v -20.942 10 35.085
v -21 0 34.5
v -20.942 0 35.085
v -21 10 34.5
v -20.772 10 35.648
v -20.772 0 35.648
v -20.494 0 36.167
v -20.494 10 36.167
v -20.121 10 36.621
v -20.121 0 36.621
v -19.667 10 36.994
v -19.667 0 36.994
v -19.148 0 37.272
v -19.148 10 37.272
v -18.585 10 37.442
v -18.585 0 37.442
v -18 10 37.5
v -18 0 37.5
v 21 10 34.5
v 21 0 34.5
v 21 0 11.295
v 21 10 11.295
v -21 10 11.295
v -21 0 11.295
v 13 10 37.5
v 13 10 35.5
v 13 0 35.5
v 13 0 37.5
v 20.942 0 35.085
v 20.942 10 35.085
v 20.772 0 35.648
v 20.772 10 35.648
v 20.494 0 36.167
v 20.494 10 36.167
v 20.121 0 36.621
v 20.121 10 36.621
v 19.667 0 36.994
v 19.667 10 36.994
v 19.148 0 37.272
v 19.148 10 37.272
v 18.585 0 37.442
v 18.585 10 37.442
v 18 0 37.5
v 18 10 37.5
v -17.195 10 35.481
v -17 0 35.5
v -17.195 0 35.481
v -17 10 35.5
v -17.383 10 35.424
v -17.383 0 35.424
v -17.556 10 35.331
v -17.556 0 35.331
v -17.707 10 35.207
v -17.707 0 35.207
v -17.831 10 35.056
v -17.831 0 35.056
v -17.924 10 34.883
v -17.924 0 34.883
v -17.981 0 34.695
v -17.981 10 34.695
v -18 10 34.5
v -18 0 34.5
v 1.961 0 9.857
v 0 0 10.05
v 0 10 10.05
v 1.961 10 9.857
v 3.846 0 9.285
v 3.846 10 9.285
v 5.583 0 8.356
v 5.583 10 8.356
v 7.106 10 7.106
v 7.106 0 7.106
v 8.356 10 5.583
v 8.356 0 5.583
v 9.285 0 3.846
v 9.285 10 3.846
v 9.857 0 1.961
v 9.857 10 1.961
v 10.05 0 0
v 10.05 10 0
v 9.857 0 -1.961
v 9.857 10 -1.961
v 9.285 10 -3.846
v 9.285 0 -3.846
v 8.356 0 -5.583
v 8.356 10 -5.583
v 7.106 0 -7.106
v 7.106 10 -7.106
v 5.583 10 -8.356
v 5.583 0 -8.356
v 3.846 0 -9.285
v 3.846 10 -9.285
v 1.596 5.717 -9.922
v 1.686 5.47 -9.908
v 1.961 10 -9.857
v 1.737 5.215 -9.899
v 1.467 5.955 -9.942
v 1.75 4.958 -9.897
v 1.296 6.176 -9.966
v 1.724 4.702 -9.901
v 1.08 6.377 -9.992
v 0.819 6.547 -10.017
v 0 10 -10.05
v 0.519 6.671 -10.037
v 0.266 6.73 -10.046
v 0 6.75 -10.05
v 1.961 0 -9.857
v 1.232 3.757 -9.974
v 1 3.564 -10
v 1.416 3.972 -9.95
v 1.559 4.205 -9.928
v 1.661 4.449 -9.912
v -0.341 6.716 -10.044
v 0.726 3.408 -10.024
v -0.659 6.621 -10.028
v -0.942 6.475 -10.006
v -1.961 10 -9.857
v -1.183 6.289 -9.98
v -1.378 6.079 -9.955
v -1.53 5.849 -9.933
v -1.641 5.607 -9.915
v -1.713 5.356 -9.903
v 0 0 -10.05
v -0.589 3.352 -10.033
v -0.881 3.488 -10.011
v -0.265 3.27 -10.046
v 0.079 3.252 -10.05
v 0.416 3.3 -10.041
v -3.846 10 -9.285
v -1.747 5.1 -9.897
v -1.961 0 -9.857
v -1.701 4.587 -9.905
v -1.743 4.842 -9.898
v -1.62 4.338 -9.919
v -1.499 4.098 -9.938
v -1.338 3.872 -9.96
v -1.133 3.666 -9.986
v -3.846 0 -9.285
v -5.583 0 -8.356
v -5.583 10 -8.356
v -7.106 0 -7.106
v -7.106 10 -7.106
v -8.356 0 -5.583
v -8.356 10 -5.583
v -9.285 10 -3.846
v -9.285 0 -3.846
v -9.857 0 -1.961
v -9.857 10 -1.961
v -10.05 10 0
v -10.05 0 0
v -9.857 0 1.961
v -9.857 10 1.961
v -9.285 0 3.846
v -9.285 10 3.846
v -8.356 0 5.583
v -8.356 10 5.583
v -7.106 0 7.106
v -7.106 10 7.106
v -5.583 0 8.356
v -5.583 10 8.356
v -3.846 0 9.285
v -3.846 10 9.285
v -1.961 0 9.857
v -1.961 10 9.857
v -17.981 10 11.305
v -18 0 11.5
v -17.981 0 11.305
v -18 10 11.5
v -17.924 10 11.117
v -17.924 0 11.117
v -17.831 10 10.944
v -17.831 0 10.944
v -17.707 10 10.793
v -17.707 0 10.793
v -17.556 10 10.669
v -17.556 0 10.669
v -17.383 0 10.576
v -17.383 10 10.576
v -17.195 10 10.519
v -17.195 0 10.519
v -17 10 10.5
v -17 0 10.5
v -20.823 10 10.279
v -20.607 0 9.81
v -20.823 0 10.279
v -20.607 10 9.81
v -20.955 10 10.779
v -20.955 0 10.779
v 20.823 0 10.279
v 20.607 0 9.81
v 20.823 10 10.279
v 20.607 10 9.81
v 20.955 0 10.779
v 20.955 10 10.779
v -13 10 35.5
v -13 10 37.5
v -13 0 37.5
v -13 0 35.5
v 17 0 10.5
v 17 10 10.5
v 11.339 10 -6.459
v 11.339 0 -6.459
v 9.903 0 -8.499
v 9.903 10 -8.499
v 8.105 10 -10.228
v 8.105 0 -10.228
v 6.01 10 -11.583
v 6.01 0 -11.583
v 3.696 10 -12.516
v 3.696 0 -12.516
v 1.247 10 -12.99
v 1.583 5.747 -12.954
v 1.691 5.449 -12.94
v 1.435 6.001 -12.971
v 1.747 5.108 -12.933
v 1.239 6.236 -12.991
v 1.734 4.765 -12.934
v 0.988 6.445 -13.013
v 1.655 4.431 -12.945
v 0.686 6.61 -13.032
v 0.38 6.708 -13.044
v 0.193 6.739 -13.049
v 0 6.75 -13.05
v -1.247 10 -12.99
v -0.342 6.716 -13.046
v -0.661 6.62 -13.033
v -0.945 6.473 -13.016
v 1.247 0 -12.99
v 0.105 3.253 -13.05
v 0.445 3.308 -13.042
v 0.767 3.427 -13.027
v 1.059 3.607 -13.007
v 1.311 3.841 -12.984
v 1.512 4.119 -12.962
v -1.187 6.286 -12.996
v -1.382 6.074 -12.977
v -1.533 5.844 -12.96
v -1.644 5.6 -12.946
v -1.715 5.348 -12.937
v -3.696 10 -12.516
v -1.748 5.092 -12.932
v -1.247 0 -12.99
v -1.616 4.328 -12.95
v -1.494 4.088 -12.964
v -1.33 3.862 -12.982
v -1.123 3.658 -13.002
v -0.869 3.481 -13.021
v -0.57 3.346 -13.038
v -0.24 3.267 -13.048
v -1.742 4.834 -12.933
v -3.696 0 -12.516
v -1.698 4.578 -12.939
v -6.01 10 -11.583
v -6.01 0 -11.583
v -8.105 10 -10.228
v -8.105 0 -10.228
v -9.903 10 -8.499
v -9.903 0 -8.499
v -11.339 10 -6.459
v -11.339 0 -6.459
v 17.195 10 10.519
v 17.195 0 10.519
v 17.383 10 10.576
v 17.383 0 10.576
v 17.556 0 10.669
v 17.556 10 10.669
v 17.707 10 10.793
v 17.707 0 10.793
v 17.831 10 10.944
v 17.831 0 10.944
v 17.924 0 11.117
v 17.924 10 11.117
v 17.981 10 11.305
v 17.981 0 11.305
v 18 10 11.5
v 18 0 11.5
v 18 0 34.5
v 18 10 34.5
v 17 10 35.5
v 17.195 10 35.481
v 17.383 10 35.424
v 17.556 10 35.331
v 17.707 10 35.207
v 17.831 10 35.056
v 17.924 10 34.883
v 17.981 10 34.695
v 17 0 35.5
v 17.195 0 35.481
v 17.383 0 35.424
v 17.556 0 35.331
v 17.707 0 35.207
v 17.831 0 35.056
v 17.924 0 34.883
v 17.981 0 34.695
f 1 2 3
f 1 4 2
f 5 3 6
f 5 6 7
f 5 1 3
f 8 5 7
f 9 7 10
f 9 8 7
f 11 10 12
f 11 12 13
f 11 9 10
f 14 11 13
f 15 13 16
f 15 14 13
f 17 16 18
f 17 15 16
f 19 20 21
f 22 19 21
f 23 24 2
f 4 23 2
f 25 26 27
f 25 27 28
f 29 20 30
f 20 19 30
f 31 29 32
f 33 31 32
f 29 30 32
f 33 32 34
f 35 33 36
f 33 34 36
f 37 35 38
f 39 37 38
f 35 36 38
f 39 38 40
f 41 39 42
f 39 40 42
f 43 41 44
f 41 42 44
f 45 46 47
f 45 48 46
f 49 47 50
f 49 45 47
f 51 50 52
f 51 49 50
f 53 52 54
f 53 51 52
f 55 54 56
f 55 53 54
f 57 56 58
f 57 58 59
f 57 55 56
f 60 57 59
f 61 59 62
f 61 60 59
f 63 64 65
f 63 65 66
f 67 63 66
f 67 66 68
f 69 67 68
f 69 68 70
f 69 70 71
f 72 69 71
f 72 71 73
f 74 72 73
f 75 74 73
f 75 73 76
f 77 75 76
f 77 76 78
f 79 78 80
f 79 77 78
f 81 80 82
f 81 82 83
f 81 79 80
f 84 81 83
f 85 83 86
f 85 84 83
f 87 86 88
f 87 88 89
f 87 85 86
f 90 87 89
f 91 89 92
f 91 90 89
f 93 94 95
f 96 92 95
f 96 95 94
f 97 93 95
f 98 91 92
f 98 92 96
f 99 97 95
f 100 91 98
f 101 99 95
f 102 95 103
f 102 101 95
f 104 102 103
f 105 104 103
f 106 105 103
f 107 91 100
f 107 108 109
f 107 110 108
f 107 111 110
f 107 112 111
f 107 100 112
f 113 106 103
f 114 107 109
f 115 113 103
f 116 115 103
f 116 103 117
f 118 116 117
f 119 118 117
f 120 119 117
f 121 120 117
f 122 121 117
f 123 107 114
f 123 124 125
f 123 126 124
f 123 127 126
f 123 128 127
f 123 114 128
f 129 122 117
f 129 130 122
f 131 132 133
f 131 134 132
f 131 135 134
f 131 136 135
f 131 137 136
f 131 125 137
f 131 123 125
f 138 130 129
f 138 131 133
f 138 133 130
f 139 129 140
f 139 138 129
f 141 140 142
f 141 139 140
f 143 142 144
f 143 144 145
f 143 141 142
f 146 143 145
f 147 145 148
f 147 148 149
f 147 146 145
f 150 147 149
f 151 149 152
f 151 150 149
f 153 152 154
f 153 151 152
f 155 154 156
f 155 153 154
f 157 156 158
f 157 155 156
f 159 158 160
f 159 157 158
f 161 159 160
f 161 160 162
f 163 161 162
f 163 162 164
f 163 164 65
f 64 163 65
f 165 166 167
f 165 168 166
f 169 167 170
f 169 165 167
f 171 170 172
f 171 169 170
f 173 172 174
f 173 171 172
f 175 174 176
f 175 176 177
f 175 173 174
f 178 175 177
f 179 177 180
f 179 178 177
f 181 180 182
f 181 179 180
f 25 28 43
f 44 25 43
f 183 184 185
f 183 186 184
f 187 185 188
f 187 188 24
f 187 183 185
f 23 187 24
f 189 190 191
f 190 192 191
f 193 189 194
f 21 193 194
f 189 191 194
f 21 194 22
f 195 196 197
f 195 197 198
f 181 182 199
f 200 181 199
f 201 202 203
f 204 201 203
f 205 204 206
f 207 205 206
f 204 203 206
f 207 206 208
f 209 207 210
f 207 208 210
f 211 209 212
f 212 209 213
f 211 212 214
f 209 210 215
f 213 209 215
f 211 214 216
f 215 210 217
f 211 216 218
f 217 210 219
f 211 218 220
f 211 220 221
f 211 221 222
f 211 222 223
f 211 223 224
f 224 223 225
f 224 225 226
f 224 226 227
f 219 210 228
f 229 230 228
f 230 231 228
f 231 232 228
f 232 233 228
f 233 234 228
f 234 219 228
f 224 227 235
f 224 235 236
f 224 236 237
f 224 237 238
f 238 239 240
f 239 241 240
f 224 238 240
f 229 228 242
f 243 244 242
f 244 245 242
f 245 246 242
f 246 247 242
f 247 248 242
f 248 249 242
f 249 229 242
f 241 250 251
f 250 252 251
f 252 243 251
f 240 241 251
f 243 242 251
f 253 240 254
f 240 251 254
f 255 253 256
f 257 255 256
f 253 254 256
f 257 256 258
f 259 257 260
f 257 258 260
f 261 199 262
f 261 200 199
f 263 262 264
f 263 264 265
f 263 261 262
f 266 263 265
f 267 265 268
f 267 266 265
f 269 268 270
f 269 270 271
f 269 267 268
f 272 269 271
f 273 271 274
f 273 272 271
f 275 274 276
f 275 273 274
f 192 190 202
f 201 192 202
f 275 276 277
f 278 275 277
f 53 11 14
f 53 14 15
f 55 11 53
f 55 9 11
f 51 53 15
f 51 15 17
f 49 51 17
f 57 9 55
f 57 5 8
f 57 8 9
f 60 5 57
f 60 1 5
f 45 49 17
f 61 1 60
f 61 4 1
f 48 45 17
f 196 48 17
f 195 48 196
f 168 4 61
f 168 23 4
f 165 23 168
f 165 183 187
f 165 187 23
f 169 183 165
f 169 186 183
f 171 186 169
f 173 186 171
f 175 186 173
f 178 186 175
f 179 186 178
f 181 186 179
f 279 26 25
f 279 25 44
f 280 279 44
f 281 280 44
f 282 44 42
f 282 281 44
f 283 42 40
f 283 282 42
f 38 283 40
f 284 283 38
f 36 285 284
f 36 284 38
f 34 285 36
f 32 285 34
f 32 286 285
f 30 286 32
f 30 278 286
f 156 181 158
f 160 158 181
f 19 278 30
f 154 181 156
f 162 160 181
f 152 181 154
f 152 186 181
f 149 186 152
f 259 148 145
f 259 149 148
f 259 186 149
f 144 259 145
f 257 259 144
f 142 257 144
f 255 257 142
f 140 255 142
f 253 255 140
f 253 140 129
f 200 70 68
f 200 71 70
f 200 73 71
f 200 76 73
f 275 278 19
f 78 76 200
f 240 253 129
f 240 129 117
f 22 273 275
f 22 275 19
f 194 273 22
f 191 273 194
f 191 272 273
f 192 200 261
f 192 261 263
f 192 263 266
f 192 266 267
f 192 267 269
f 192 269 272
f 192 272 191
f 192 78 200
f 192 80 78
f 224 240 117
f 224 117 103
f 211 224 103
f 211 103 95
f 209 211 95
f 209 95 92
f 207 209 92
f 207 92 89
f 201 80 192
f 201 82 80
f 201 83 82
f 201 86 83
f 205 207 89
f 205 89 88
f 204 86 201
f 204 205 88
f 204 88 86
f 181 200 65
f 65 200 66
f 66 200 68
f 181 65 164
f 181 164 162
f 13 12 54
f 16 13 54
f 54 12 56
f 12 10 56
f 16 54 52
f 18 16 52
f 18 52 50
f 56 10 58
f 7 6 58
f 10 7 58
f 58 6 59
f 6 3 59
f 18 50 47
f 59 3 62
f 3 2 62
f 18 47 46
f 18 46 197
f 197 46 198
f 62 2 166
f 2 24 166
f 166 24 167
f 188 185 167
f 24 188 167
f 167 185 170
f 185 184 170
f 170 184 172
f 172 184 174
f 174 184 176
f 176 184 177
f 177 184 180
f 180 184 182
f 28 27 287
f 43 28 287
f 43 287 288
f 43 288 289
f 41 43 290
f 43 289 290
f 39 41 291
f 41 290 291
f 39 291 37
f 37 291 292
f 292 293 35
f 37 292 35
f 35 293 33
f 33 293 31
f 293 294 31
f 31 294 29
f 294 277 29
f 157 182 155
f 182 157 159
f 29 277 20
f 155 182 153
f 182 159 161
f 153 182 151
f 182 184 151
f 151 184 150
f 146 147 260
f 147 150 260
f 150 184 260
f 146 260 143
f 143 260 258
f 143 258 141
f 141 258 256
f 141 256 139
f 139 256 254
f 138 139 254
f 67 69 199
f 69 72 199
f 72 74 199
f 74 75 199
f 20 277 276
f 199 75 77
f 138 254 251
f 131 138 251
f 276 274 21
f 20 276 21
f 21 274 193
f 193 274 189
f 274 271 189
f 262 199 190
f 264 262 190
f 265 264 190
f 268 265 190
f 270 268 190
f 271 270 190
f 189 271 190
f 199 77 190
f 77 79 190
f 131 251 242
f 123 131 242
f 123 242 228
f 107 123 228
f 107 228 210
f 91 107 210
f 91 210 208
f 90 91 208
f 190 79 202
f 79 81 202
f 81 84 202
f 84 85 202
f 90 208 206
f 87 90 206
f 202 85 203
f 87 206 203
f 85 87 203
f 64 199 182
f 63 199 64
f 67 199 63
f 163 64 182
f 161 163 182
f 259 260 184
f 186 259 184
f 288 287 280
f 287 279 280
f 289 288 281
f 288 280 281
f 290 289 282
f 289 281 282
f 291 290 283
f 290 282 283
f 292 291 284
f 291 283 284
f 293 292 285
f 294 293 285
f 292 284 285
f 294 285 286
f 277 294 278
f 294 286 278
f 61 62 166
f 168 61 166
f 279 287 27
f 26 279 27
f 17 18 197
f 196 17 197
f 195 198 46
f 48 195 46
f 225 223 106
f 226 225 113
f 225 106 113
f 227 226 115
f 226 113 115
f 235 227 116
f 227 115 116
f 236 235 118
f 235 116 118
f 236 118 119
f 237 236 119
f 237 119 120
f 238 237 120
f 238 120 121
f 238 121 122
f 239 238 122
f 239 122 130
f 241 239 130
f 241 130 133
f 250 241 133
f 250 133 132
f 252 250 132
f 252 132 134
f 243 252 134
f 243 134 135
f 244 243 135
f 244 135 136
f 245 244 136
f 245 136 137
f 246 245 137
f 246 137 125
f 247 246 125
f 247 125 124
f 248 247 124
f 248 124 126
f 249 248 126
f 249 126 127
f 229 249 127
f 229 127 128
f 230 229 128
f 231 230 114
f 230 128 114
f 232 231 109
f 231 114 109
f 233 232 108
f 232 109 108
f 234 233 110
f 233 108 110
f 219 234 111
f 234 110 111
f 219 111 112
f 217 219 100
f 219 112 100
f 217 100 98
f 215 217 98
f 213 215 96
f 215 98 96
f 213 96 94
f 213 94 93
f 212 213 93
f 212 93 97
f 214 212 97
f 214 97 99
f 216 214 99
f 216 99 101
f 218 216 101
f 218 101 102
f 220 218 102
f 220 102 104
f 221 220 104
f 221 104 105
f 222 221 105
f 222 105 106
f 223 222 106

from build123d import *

# Parameters (mm, degrees)
SKETCH_1_R          = 10.05
EXTRUDE_1_DEPTH     = 10
FILLET_1_R          = 3
FILLET_2_R          = 1
SKETCH_2_R          = 1.75
CUT_EXTRUDE_1_DEPTH = 45.127655727


with BuildPart() as part:
    # 草图1 → 凸台-拉伸1 (new body)
    with BuildSketch(Plane(origin=(0, 0, 0), x_dir=(1, 0, 0), z_dir=(0, 1, 0))):
        with BuildLine():
            Line((-11.33930071, 6.459315707), (-21, -10.5))
            Line((-21, -10.5), (-21, -37.5))
            Line((-21, -37.5), (-13, -37.5))
            Line((-13, -37.5), (-13, -35.5))
            Line((-13, -35.5), (-18, -35.5))
            Line((-18, -35.5), (-18, -10.5))
            Line((-18, -10.5), (18, -10.5))
            Line((18, -10.5), (18, -35.5))
            Line((18, -35.5), (13, -35.5))
            Line((13, -35.5), (13, -37.5))
            Line((13, -37.5), (21, -37.5))
            Line((21, -37.5), (21, -10.5))
            Line((21, -10.5), (11.33930071, 6.459315707))
            ThreePointArc((11.33930071, 6.459315707), (0, 13.05), (-11.33930071, 6.459315707))
        make_face()
        with Locations(Location((0, 0, 0), (0, 0, 270))):
            Circle(SKETCH_1_R, mode=Mode.SUBTRACT)
    extrude(amount=EXTRUDE_1_DEPTH)

    # 圆角1
    fillet_1_edges = [part.edges().sort_by_distance(p)[0] for p in [
        (21, 5, 37.5),
        (-21, 5, 37.5),
        (-21, 5, 10.5),
        (21, 5, 10.5),
    ]]
    fillet(fillet_1_edges, radius=FILLET_1_R)

    # 圆角2
    fillet_2_edges = [part.edges().sort_by_distance(p)[0] for p in [
        (18, 5, 10.5),
        (-18, 5, 10.5),
        (-18, 5, 35.5),
        (18, 5, 35.5),
    ]]
    fillet(fillet_2_edges, radius=FILLET_2_R)

    # 草图2 → 切除-拉伸1 (cut, through all)
    with BuildSketch(Plane.XY):
        with Locations(Location((0, 5, 0), (0, 0, 90))):
            Circle(SKETCH_2_R)
    extrude(amount=-CUT_EXTRUDE_1_DEPTH, mode=Mode.SUBTRACT)


solid = part.part
